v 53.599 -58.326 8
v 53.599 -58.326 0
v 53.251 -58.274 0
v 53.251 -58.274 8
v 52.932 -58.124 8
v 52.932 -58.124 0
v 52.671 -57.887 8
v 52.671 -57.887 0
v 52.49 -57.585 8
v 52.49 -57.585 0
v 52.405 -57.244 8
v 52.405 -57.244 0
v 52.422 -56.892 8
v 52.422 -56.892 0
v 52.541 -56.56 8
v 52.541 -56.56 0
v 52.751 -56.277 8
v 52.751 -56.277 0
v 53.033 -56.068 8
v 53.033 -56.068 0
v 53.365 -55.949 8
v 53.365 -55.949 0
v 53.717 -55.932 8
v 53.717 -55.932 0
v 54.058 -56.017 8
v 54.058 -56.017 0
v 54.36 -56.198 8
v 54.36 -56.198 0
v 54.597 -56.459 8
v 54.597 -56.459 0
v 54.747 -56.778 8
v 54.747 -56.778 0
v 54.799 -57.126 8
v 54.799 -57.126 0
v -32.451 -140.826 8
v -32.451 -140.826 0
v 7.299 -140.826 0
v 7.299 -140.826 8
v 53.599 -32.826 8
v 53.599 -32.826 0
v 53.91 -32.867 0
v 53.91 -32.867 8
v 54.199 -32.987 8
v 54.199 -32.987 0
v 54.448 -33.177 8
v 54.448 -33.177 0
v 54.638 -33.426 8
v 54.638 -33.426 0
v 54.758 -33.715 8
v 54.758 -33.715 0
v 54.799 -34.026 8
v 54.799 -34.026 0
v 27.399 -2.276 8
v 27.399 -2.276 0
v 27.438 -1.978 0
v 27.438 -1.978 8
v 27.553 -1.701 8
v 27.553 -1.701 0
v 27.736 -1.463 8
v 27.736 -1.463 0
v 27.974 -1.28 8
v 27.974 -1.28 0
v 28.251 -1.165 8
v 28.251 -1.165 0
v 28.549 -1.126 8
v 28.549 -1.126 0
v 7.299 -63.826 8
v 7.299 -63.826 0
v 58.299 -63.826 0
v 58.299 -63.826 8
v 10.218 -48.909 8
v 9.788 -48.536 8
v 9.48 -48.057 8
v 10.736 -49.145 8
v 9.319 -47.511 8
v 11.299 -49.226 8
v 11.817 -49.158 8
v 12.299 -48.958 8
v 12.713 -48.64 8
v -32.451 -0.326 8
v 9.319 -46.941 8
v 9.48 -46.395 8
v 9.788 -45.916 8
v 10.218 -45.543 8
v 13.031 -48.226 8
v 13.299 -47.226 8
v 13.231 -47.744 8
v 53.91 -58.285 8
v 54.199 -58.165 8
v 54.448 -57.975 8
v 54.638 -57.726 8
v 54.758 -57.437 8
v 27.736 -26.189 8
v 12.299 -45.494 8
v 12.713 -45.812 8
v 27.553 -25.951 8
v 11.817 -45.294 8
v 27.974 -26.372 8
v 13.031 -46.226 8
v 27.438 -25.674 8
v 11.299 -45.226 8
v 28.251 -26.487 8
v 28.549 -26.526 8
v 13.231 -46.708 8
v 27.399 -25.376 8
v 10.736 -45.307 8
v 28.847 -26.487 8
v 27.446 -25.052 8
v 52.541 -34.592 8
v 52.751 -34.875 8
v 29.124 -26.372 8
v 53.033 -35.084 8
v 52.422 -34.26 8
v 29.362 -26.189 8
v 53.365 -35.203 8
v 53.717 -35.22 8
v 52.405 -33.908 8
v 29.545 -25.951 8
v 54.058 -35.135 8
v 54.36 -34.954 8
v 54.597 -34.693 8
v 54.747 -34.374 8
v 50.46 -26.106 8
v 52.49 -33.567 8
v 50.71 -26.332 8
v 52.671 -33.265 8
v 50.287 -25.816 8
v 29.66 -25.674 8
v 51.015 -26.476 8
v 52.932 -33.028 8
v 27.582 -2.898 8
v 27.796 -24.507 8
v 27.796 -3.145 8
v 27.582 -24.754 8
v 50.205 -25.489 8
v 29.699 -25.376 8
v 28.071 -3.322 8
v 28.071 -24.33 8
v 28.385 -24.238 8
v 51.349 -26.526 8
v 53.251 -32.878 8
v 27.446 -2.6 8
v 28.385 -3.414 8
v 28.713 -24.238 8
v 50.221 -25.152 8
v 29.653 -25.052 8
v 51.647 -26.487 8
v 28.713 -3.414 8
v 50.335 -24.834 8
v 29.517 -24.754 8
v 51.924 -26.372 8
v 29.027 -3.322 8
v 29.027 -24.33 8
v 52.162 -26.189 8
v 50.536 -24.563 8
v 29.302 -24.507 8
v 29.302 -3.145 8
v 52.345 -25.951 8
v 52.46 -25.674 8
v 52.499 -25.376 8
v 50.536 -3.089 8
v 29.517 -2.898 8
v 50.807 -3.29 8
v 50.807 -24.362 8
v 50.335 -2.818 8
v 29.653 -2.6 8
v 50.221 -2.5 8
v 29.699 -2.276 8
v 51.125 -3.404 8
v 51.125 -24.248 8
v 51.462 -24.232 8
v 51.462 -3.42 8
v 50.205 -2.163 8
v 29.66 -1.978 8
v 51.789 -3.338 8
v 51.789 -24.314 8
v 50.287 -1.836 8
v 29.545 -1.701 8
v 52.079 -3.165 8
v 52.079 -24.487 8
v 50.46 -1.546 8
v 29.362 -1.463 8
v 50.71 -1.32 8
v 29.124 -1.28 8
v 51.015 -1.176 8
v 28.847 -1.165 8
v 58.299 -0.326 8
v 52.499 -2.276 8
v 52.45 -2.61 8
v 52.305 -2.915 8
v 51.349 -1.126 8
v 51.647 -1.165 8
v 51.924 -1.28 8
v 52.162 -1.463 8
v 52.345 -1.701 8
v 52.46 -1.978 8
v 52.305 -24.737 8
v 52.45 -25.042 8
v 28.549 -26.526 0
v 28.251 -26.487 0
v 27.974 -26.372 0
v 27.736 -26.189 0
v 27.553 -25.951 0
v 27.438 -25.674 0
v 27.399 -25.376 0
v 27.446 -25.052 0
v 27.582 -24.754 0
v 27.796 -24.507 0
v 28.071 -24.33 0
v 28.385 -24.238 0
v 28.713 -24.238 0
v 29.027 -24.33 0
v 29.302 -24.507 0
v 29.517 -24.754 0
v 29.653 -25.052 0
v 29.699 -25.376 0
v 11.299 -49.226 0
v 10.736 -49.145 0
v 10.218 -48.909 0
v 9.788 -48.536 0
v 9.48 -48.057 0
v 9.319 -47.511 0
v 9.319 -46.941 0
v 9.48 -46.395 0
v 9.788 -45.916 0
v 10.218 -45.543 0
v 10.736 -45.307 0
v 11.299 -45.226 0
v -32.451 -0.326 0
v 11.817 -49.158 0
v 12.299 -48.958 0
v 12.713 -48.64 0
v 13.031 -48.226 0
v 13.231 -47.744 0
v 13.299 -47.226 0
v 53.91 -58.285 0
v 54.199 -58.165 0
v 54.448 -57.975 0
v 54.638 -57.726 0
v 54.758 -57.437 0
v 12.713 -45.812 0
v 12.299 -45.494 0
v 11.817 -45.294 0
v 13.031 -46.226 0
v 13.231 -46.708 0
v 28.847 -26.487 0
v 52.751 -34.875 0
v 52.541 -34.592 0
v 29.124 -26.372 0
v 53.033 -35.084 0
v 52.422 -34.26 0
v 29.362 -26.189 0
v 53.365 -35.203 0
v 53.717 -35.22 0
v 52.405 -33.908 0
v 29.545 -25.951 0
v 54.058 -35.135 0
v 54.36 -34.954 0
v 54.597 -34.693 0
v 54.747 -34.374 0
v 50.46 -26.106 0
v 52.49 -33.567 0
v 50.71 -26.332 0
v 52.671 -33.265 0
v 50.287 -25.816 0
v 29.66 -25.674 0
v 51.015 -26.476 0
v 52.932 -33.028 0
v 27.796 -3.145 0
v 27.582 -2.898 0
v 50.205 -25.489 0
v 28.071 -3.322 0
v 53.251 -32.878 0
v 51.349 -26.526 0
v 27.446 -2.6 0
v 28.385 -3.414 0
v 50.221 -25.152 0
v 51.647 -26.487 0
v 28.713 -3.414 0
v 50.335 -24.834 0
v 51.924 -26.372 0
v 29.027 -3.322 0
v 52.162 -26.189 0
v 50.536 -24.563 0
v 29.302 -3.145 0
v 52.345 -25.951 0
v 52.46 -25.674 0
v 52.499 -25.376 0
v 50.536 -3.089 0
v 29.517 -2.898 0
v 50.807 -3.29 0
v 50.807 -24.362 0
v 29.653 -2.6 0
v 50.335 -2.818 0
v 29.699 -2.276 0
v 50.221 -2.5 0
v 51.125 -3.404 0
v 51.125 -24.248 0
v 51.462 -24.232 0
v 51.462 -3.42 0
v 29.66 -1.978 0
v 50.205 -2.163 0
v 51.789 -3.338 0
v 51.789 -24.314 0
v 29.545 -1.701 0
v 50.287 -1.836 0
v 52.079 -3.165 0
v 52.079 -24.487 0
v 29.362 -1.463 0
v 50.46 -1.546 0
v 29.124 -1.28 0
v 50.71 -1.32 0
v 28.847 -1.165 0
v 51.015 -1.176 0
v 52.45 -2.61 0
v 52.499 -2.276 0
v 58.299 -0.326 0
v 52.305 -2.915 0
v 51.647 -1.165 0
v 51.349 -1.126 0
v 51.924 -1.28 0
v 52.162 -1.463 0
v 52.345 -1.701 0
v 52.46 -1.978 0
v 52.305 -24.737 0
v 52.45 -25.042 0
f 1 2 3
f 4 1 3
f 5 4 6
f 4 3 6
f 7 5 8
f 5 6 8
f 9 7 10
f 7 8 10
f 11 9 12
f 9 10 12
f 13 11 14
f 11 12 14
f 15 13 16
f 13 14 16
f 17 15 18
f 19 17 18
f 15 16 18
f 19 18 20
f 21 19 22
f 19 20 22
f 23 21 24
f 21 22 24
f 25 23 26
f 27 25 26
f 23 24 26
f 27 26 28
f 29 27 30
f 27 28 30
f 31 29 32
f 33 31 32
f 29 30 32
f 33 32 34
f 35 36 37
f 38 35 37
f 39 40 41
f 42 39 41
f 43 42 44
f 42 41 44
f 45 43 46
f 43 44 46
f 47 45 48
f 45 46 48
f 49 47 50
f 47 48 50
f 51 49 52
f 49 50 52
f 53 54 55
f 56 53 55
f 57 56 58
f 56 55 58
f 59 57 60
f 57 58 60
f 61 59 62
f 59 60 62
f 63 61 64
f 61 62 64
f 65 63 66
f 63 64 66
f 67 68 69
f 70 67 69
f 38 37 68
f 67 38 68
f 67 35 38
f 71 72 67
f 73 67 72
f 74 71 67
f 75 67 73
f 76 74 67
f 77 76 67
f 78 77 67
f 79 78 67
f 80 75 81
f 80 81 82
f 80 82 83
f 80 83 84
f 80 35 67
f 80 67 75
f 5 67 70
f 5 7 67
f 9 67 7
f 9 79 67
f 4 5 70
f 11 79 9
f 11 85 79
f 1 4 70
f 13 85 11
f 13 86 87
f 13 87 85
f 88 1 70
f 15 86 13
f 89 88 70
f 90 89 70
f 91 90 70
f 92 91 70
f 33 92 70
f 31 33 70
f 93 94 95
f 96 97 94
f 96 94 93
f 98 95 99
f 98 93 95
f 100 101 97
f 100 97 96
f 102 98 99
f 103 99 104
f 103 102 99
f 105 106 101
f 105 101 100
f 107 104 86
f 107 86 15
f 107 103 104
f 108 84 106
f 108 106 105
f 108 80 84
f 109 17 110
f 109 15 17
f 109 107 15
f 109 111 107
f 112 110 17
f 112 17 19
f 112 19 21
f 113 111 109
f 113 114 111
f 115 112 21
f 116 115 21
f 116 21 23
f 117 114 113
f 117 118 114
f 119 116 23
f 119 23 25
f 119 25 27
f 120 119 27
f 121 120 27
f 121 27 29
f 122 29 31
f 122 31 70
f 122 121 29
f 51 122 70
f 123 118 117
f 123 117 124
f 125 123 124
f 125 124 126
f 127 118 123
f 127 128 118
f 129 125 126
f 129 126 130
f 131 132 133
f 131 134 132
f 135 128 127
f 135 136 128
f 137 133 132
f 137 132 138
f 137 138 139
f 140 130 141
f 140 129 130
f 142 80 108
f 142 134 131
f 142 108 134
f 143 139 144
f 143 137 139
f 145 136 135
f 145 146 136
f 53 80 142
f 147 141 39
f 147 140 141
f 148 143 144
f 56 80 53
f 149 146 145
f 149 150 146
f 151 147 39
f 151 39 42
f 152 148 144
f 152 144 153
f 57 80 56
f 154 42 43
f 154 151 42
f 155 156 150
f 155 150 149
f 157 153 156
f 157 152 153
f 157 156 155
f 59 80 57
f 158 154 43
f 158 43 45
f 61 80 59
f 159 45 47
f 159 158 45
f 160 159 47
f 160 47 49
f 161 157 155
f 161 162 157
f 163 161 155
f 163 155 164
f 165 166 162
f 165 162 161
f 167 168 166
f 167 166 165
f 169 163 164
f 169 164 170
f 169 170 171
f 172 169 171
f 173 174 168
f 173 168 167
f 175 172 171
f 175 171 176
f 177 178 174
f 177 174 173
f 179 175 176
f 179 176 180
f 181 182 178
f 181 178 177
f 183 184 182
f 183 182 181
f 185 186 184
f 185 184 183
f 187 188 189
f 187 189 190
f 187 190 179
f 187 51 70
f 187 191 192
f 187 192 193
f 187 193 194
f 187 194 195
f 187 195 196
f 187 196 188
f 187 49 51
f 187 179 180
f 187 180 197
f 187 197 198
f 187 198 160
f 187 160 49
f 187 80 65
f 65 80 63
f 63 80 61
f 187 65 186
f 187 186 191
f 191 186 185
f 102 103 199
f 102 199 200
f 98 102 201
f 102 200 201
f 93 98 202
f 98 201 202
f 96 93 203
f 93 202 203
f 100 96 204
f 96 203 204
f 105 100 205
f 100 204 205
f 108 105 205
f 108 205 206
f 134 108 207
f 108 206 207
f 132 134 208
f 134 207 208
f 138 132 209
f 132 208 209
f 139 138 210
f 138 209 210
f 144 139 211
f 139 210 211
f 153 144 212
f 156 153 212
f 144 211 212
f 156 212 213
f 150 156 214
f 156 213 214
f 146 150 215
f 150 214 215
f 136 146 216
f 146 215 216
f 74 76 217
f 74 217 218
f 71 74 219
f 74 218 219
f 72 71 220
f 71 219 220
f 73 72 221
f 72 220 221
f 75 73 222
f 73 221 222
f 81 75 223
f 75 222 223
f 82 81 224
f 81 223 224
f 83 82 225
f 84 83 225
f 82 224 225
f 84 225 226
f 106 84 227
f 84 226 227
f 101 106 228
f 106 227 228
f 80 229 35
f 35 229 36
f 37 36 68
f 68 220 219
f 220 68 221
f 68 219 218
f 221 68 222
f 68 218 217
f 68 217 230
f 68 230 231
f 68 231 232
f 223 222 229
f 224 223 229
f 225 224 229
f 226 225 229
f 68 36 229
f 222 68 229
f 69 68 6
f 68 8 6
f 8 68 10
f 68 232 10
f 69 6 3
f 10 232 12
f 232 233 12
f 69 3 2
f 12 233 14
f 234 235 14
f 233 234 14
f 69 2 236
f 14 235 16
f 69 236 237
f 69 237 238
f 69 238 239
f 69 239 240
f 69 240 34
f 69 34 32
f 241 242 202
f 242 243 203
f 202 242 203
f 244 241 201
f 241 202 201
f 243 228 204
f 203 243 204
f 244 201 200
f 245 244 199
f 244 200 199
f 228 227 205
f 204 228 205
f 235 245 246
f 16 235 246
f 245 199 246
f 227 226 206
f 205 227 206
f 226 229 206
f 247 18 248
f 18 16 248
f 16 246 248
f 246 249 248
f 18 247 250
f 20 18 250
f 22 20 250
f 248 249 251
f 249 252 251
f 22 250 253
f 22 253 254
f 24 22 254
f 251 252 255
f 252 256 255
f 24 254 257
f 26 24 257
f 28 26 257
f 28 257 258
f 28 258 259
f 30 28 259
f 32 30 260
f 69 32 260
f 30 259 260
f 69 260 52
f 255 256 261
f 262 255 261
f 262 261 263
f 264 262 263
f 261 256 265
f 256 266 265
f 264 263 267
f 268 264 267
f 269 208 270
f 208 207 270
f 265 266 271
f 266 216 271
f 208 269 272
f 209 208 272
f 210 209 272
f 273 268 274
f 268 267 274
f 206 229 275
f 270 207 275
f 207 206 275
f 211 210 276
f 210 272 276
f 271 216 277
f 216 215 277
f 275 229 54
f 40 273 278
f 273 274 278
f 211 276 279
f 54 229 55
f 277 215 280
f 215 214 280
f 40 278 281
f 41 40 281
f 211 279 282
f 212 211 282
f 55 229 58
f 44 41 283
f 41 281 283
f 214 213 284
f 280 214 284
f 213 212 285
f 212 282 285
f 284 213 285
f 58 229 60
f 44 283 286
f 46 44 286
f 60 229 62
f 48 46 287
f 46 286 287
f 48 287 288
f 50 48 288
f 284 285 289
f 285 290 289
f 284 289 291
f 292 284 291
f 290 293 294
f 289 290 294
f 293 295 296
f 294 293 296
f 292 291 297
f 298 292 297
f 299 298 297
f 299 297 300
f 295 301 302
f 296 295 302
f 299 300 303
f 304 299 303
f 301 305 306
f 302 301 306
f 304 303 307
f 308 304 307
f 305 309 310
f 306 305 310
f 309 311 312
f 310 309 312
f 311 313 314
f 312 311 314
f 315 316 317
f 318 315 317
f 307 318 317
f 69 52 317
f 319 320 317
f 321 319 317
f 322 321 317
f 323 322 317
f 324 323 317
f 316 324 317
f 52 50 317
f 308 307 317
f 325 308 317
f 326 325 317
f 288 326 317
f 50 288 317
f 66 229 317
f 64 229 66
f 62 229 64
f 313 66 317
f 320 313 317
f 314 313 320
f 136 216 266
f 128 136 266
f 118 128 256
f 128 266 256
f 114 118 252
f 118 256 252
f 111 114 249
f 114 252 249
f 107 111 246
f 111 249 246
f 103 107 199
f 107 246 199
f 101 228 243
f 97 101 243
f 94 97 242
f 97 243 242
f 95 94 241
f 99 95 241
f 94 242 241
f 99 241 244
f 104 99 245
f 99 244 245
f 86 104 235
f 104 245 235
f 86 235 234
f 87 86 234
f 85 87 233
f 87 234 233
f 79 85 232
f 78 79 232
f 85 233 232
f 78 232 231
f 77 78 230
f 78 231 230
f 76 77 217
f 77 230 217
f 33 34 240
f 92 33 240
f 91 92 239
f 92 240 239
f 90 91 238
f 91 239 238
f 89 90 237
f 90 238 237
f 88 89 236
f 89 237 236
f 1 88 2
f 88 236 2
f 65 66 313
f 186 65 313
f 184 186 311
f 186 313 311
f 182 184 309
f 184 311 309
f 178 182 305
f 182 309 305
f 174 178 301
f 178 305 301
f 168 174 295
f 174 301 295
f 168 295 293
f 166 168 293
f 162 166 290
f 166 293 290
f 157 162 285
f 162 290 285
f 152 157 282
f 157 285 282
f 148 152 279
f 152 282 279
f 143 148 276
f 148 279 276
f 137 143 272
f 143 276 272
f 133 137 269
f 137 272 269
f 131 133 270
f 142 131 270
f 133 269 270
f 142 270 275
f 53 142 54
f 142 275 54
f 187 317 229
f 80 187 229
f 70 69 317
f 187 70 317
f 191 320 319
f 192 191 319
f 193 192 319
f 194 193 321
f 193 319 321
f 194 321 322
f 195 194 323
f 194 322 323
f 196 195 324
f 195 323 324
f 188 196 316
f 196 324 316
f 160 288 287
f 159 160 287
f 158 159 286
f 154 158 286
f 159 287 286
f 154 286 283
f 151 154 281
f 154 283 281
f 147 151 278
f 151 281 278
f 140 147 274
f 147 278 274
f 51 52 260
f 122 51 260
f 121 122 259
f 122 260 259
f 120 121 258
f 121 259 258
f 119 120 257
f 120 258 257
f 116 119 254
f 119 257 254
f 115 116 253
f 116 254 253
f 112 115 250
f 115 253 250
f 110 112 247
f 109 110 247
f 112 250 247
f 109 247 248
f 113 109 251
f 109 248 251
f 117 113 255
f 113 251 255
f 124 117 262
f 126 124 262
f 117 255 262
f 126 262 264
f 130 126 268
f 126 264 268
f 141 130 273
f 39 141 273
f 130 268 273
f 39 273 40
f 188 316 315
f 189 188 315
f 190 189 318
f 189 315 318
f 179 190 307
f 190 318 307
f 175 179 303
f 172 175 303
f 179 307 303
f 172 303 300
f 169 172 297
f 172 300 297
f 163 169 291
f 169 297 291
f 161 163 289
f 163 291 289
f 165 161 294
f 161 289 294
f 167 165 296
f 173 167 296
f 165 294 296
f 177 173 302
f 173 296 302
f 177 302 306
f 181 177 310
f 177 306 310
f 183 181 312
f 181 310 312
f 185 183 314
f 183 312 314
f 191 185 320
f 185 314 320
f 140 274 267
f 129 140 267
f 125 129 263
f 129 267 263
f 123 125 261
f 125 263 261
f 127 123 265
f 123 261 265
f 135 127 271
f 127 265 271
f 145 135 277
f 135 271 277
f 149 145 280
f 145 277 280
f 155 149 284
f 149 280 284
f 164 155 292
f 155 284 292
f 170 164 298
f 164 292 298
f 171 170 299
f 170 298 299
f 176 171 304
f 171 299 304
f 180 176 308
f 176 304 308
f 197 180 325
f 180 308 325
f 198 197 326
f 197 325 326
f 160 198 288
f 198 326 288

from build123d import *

# Parameters (mm, degrees)
F0_W     = 39.75
F0_H     = 5
F0_W_2   = 4
F0_H_2   = 9
F0_H_3   = 77
F0_W_3   = 3
F0_H_4   = 26.5
F0_H_5   = 1.95
F0_W_4   = 5
F0_H_6   = 17
F0_H_7   = 23.1
F1_DEPTH = 8


with BuildPart() as f1:
    # F0 (on Top) → F1 (new body)
    with BuildSketch(Plane.XY):
        Polygon((-32.4509056807, -49.8260023594), (-32.4509056807, -58.8260023594), (7.2990943193, -58.8260023594), (7.2990943193, -49.8260023594), (-26.0348562151, -49.8260023594), align=None)
        with Locations((-12.5759056807, -61.3260023594)):
            Rectangle(F0_W, F0_H)
        with Locations((9.2990943193, -54.3260023594)):
            Rectangle(F0_W_2, F0_H_2)
        Polygon((11.2990943193, -58.8260023594), (7.2990943193, -58.8260023594), (7.2990943193, -63.8260023594), (14.2990943193, -63.8260023594), (19.2990943193, -63.8260023594), (58.2990943193, -63.8260023594), (58.2990943193, -22.3260023594), (53.2990943193, -22.3260023594), (53.2990943193, -25.3760023594), (53.2990943193, -27.3260023594), (51.3490943193, -27.3260023594), (28.5490943193, -27.3260023594), (23.2990943193, -27.3260023594), (23.2990943193, -32.3260023594), (53.5990943193, -32.3260023594), (55.2990943193, -32.3260023594), (55.2990943193, -34.0260023594), (55.2990943193, -57.1260023594), (55.2990943193, -58.8260023594), (53.5990943193, -58.8260023594), (23.2990943193, -58.8260023594), (19.2990943193, -58.8260023594), (14.2990943193, -58.8260023594), align=None)
        with BuildLine():
            Line((-32.4509056807, -0.3260023594), (-32.4509056807, -49.8260023594))
            Line((-32.4509056807, -49.8260023594), (-26.0348562151, -49.8260023594))
            Line((-26.0348562151, -49.8260023594), (7.2990943193, -49.8260023594))
            Line((7.2990943193, -49.8260023594), (11.2990943193, -49.8260023594))
            Line((11.2990943193, -49.8260023594), (11.2990943193, -49.2260023594))
            ThreePointArc((11.2990943193, -49.2260023594), (9.2990943193, -47.2260023594), (11.2990943193, -45.2260023594))
            Line((11.2990943193, -45.2260023594), (11.2990943193, -0.3260023594))
            Line((11.2990943193, -0.3260023594), (-32.4509056807, -0.3260023594))
        make_face()
        with Locations((-12.5759056807, -102.3260023594)):
            Rectangle(F0_W, F0_H_3)
        with Locations((12.7990943193, -54.3260023594)):
            Rectangle(F0_W_3, F0_H_2)
        Polygon((14.2990943193, -49.8260023594), (14.2990943193, -58.8260023594), (19.2990943193, -58.8260023594), (19.2990943193, -32.3260023594), (23.2990943193, -32.3260023594), (23.2990943193, -27.3260023594), (19.2990943193, -27.3260023594), (19.2990943193, -25.3760023594), (19.2990943193, -2.2760023594), (19.2990943193, -0.3260023594), (14.2990943193, -0.3260023594), (14.2990943193, -27.3260023594), (14.2990943193, -32.3260023594), (14.2990943193, -47.2260023594), align=None)
        with BuildLine():
            Line((11.2990943193, -49.2260023594), (11.2990943193, -49.8260023594))
            Line((11.2990943193, -49.8260023594), (14.2990943193, -49.8260023594))
            Line((14.2990943193, -49.8260023594), (14.2990943193, -47.2260023594))
            Line((14.2990943193, -47.2260023594), (13.2990943193, -47.2260023594))
            ThreePointArc((13.2990943193, -47.2260023594), (12.7133078817, -48.6402159218), (11.2990943193, -49.2260023594))
        make_face()
        with BuildLine():
            Line((14.2990943193, -0.3260023594), (11.2990943193, -0.3260023594))
            Line((11.2990943193, -0.3260023594), (11.2990943193, -45.2260023594))
            ThreePointArc((11.2990943193, -45.2260023594), (12.7133078817, -45.811788797), (13.2990943193, -47.2260023594))
            Line((13.2990943193, -47.2260023594), (14.2990943193, -47.2260023594))
            Line((14.2990943193, -47.2260023594), (14.2990943193, -32.3260023594))
            Line((14.2990943193, -32.3260023594), (14.2990943193, -27.3260023594))
            Line((14.2990943193, -27.3260023594), (14.2990943193, -0.3260023594))
        make_face()
        with Locations((21.2990943193, -45.5760023594)):
            Rectangle(F0_W_2, F0_H_4)
        with BuildLine():
            Line((23.2990943193, -32.3260023594), (23.2990943193, -58.8260023594))
            Line((23.2990943193, -58.8260023594), (53.5990943193, -58.8260023594))
            Line((53.5990943193, -58.8260023594), (53.5990943193, -58.3260023594))
            ThreePointArc((53.5990943193, -58.3260023594), (52.7505661819, -56.277474222), (54.7990943193, -57.1260023594))
            Line((54.7990943193, -57.1260023594), (55.2990943193, -57.1260023594))
            Line((55.2990943193, -57.1260023594), (55.2990943193, -34.0260023594))
            Line((55.2990943193, -34.0260023594), (54.7990943193, -34.0260023594))
            ThreePointArc((54.7990943193, -34.0260023594), (52.7505661819, -34.8745304968), (53.5990943193, -32.8260023594))
            Line((53.5990943193, -32.8260023594), (53.5990943193, -32.3260023594))
            Line((53.5990943193, -32.3260023594), (23.2990943193, -32.3260023594))
        make_face()
        with Locations((21.2990943193, -1.3010023594)):
            Rectangle(F0_W_2, F0_H_5)
        with BuildLine():
            Line((53.5990943193, -58.3260023594), (53.5990943193, -58.8260023594))
            Line((53.5990943193, -58.8260023594), (55.2990943193, -58.8260023594))
            Line((55.2990943193, -58.8260023594), (55.2990943193, -57.1260023594))
            Line((55.2990943193, -57.1260023594), (54.7990943193, -57.1260023594))
            ThreePointArc((54.7990943193, -57.1260023594), (54.4476224568, -57.9745304968), (53.5990943193, -58.3260023594))
        make_face()
        with Locations((55.7990943193, -13.8260023594)):
            Rectangle(F0_W_4, F0_H_6)
        with BuildLine():
            Line((28.5490943193, -0.3260023594), (23.2990943193, -0.3260023594))
            Line((23.2990943193, -0.3260023594), (23.2990943193, -2.2760023594))
            Line((23.2990943193, -2.2760023594), (27.3990943193, -2.2760023594))
            ThreePointArc((27.3990943193, -2.2760023594), (27.735921521, -1.462829561), (28.5490943193, -1.1260023594))
            Line((28.5490943193, -1.1260023594), (28.5490943193, -0.3260023594))
        make_face()
        with Locations((21.2990943193, -13.8260023594)):
            Rectangle(F0_W_2, F0_H_7)
        with BuildLine():
            Line((55.2990943193, -32.3260023594), (53.5990943193, -32.3260023594))
            Line((53.5990943193, -32.3260023594), (53.5990943193, -32.8260023594))
            ThreePointArc((53.5990943193, -32.8260023594), (54.4476224568, -33.177474222), (54.7990943193, -34.0260023594))
            Line((54.7990943193, -34.0260023594), (55.2990943193, -34.0260023594))
            Line((55.2990943193, -34.0260023594), (55.2990943193, -32.3260023594))
        make_face()
        with BuildLine():
            Line((23.2990943193, -25.3760023594), (23.2990943193, -27.3260023594))
            Line((23.2990943193, -27.3260023594), (28.5490943193, -27.3260023594))
            Line((28.5490943193, -27.3260023594), (28.5490943193, -26.5260023594))
            ThreePointArc((28.5490943193, -26.5260023594), (27.735921521, -26.1891751578), (27.3990943193, -25.3760023594))
            Line((27.3990943193, -25.3760023594), (23.2990943193, -25.3760023594))
        make_face()
        with Locations((21.2990943193, -26.3510023594)):
            Rectangle(F0_W_2, F0_H_5)
        with BuildLine():
            Line((53.2990943193, -25.3760023594), (53.2990943193, -22.3260023594))
            Line((53.2990943193, -22.3260023594), (53.2990943193, -5.3260023594))
            Line((53.2990943193, -5.3260023594), (53.2990943193, -2.2760023594))
            Line((53.2990943193, -2.2760023594), (52.4990943193, -2.2760023594))
            ThreePointArc((52.4990943193, -2.2760023594), (50.535921521, -3.0891751578), (51.3490943193, -1.1260023594))
            Line((51.3490943193, -1.1260023594), (51.3490943193, -0.3260023594))
            Line((51.3490943193, -0.3260023594), (28.5490943193, -0.3260023594))
            Line((28.5490943193, -0.3260023594), (28.5490943193, -1.1260023594))
            ThreePointArc((28.5490943193, -1.1260023594), (29.3622671177, -1.462829561), (29.6990943193, -2.2760023594))
            ThreePointArc((29.6990943193, -2.2760023594), (28.5490943193, -3.4260023594), (27.3990943193, -2.2760023594))
            Line((27.3990943193, -2.2760023594), (23.2990943193, -2.2760023594))
            Line((23.2990943193, -2.2760023594), (23.2990943193, -25.3760023594))
            Line((23.2990943193, -25.3760023594), (27.3990943193, -25.3760023594))
            ThreePointArc((27.3990943193, -25.3760023594), (28.5490943193, -24.2260023594), (29.6990943193, -25.3760023594))
            ThreePointArc((29.6990943193, -25.3760023594), (29.3622671177, -26.1891751578), (28.5490943193, -26.5260023594))
            Line((28.5490943193, -26.5260023594), (28.5490943193, -27.3260023594))
            Line((28.5490943193, -27.3260023594), (51.3490943193, -27.3260023594))
            Line((51.3490943193, -27.3260023594), (51.3490943193, -26.5260023594))
            ThreePointArc((51.3490943193, -26.5260023594), (50.535921521, -24.562829561), (52.4990943193, -25.3760023594))
            Line((52.4990943193, -25.3760023594), (53.2990943193, -25.3760023594))
        make_face()
        Polygon((53.2990943193, -5.3260023594), (58.2990943193, -5.3260023594), (58.2990943193, -0.3260023594), (53.2990943193, -0.3260023594), (53.2990943193, -2.2760023594), align=None)
        with BuildLine():
            Line((53.2990943193, -27.3260023594), (53.2990943193, -25.3760023594))
            Line((53.2990943193, -25.3760023594), (52.4990943193, -25.3760023594))
            ThreePointArc((52.4990943193, -25.3760023594), (52.1622671177, -26.1891751578), (51.3490943193, -26.5260023594))
            Line((51.3490943193, -26.5260023594), (51.3490943193, -27.3260023594))
            Line((51.3490943193, -27.3260023594), (53.2990943193, -27.3260023594))
        make_face()
        with BuildLine():
            Line((53.2990943193, -0.3260023594), (51.3490943193, -0.3260023594))
            Line((51.3490943193, -0.3260023594), (51.3490943193, -1.1260023594))
            ThreePointArc((51.3490943193, -1.1260023594), (52.1622671177, -1.462829561), (52.4990943193, -2.2760023594))
            Line((52.4990943193, -2.2760023594), (53.2990943193, -2.2760023594))
            Line((53.2990943193, -2.2760023594), (53.2990943193, -0.3260023594))
        make_face()
    extrude(amount=F1_DEPTH)


solid = f1.part
